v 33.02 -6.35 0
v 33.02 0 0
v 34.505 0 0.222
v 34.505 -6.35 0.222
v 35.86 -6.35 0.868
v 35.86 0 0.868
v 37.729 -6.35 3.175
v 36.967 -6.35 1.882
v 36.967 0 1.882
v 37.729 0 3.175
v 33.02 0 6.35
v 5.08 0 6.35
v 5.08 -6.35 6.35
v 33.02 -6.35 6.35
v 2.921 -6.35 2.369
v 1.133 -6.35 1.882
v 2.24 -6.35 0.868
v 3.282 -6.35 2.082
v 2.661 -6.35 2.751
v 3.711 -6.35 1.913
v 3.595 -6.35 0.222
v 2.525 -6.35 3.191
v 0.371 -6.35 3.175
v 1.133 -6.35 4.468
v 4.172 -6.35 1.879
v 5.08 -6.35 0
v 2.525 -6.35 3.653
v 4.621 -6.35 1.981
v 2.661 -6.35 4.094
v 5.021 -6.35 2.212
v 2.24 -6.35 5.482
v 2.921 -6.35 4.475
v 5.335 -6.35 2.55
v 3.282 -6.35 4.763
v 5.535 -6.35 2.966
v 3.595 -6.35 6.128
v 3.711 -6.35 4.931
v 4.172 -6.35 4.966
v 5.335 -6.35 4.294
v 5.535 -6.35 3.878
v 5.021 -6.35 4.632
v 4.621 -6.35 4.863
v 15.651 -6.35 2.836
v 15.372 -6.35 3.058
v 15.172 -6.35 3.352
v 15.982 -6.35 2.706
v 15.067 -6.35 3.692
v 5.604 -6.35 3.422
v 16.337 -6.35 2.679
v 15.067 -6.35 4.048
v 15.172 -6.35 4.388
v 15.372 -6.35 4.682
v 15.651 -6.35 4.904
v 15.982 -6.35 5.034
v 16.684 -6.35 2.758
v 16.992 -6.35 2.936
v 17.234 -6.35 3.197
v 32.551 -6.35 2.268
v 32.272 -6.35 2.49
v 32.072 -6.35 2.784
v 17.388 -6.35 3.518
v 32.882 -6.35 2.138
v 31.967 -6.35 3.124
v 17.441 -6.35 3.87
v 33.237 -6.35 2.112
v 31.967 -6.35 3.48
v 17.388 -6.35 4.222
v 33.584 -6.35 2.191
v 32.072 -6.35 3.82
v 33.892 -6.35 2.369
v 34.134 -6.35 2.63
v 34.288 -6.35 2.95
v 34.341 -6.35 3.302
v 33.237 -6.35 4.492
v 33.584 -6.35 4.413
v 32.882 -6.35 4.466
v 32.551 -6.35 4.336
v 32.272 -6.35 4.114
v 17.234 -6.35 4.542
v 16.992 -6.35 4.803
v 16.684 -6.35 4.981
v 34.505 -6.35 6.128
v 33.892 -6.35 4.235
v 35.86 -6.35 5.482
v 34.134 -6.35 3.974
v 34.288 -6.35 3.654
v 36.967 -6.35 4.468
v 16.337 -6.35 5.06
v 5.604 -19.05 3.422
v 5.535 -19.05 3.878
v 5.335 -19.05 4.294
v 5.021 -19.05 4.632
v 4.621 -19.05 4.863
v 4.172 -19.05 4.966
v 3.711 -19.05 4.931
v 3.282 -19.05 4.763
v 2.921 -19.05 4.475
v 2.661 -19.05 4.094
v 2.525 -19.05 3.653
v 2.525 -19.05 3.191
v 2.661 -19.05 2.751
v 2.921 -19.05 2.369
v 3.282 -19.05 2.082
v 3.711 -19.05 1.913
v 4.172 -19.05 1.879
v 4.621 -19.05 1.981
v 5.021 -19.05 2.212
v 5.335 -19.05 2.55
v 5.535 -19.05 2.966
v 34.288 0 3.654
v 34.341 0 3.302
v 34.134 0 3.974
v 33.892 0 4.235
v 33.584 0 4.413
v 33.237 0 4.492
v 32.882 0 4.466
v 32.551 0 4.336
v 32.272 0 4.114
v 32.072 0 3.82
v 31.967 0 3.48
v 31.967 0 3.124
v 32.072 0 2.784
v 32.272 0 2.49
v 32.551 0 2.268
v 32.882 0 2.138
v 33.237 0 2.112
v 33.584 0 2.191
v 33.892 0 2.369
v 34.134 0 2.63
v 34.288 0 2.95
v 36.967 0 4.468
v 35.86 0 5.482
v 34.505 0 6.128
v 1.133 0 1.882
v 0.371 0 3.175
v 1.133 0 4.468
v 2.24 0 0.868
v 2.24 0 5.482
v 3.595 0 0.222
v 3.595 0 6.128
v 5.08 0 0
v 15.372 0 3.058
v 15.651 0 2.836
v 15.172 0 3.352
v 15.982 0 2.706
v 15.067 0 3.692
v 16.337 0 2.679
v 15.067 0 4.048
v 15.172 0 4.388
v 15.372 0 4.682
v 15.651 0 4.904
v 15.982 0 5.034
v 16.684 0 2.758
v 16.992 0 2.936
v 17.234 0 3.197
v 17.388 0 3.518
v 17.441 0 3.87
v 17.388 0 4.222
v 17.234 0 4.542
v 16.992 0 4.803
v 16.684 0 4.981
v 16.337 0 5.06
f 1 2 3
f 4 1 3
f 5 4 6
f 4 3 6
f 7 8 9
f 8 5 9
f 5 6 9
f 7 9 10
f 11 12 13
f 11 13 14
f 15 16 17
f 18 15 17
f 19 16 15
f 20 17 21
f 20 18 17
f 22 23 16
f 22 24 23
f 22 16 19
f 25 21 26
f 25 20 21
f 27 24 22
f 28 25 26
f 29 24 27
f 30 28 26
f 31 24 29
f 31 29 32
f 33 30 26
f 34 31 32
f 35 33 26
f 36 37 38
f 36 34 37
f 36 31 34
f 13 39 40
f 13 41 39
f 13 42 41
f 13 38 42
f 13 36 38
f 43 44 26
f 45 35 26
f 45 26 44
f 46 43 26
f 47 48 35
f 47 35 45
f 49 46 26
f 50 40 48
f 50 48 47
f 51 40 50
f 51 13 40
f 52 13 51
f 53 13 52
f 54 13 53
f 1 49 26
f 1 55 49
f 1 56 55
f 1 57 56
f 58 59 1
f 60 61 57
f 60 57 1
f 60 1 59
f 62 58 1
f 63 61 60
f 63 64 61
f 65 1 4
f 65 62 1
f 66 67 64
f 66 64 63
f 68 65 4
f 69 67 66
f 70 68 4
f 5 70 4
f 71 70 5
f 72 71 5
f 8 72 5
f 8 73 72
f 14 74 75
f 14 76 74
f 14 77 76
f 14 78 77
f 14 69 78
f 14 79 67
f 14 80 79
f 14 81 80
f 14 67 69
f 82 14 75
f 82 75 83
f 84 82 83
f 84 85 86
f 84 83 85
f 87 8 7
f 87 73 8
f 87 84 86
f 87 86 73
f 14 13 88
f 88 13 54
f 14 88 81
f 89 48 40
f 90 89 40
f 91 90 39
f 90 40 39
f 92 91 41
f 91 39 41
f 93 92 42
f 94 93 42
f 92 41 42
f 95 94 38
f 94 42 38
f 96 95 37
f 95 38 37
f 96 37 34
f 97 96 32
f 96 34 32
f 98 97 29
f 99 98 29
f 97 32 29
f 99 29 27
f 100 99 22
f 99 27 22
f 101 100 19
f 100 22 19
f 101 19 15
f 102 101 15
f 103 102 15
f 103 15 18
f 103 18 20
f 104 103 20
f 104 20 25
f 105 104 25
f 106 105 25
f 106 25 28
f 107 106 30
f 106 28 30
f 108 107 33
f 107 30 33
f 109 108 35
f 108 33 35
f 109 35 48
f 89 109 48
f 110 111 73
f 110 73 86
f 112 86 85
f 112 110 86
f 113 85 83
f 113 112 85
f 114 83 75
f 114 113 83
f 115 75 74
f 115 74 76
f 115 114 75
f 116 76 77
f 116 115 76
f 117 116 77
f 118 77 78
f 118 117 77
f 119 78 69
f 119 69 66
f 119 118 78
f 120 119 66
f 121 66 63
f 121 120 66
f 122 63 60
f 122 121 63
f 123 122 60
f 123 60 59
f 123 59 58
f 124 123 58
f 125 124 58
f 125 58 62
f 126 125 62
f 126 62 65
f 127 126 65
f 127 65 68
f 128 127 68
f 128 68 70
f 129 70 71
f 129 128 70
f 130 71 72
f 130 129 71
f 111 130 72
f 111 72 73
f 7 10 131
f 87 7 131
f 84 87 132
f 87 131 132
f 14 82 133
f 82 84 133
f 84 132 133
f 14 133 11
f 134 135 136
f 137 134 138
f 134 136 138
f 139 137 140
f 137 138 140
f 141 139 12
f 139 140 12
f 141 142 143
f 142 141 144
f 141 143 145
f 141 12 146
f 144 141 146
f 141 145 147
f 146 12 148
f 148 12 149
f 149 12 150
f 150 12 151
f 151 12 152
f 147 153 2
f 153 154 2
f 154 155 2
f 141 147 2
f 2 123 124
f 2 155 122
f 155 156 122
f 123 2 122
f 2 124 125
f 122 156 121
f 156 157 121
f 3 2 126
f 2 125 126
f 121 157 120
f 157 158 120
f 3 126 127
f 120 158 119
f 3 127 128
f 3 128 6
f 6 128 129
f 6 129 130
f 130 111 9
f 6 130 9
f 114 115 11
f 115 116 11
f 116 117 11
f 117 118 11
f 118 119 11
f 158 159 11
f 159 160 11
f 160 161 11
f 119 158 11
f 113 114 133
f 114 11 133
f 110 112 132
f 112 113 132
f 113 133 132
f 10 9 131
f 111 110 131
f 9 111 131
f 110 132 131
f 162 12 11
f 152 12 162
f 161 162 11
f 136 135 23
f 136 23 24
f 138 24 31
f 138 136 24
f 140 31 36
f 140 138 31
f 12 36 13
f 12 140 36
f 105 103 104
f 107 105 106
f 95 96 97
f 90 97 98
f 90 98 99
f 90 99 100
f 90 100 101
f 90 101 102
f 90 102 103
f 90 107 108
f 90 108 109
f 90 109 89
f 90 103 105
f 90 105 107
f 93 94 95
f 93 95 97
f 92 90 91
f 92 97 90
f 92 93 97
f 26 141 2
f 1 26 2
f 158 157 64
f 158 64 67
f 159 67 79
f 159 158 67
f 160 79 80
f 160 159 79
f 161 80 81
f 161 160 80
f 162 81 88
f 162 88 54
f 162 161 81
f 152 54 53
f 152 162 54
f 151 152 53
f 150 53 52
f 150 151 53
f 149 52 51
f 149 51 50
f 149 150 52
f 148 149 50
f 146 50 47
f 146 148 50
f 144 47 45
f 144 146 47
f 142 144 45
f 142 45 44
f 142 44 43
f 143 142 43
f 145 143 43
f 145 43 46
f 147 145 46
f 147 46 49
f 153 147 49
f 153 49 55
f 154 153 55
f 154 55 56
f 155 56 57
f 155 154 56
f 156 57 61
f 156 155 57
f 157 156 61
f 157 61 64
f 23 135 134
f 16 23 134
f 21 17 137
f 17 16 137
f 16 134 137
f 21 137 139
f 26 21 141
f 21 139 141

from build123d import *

# Parameters (mm, degrees)
F0_W        = 38.1
F0_H        = 6.35
F0_R        = 1.1938
F1_DEPTH    = 6.35
F2_T1_DEPTH = 31.75
F3_R        = 1.547841459
F4_DEPTH    = 12.7


# Not quite as in the source:
# - a fillet or chamfer that OpenCascade refuses, or shapes differently, is made with other operations: its cross-section is extruded or revolved along the edge and cut away or added


with BuildPart() as f1:
    # F0 (on Front) → F1 (new body)
    with BuildSketch(Plane.XZ):
        with Locations((19.05, 3.175)):
            Rectangle(F0_W, F0_H)
        with Locations((16.2474811077, 3.8697349373)):
            Circle(F0_R, mode=Mode.SUBTRACT)
        with Locations((33.1476069987, 3.302)):
            Circle(F0_R, mode=Mode.SUBTRACT)
    extrude(amount=F1_DEPTH)

    # F2: fillet of radius 5.08 on 4 edges, made by hand

    # F2_s2 → F2_t1 (cut)
    with BuildSketch(Plane.XZ.offset(-12.7)):
        with BuildLine():
            ThreePointArc((0, 1.27), (1.4878975516, 4.8621024484), (5.08, 6.35))
            Line((5.08, 6.35), (0, 6.35))
            Line((0, 6.35), (0, 1.27))
        make_face()
        with BuildLine():
            ThreePointArc((0, 5.08), (1.4878975516, 1.4878975516), (5.08, 0))
            Line((5.08, 0), (0, 0))
            Line((0, 0), (0, 5.08))
        make_face()
        with BuildLine():
            ThreePointArc((38.1, 1.27), (36.6121024484, 4.8621024484), (33.02, 6.35))
            Line((33.02, 6.35), (38.1, 6.35))
            Line((38.1, 6.35), (38.1, 1.27))
        make_face()
        with BuildLine():
            ThreePointArc((33.02, 0), (36.6121024484, 1.4878975516), (38.1, 5.08))
            Line((38.1, 5.08), (38.1, 0))
            Line((38.1, 0), (33.02, 0))
        make_face()
    extrude(amount=F2_T1_DEPTH, mode=Mode.SUBTRACT)

    # F3 (on face) → F4 (join)
    with BuildSketch(Plane.XZ.offset(6.35)):
        with Locations((4.0558986366, 3.4221061505)):
            Circle(F3_R)
    extrude(amount=F4_DEPTH)


solid = f1.part
